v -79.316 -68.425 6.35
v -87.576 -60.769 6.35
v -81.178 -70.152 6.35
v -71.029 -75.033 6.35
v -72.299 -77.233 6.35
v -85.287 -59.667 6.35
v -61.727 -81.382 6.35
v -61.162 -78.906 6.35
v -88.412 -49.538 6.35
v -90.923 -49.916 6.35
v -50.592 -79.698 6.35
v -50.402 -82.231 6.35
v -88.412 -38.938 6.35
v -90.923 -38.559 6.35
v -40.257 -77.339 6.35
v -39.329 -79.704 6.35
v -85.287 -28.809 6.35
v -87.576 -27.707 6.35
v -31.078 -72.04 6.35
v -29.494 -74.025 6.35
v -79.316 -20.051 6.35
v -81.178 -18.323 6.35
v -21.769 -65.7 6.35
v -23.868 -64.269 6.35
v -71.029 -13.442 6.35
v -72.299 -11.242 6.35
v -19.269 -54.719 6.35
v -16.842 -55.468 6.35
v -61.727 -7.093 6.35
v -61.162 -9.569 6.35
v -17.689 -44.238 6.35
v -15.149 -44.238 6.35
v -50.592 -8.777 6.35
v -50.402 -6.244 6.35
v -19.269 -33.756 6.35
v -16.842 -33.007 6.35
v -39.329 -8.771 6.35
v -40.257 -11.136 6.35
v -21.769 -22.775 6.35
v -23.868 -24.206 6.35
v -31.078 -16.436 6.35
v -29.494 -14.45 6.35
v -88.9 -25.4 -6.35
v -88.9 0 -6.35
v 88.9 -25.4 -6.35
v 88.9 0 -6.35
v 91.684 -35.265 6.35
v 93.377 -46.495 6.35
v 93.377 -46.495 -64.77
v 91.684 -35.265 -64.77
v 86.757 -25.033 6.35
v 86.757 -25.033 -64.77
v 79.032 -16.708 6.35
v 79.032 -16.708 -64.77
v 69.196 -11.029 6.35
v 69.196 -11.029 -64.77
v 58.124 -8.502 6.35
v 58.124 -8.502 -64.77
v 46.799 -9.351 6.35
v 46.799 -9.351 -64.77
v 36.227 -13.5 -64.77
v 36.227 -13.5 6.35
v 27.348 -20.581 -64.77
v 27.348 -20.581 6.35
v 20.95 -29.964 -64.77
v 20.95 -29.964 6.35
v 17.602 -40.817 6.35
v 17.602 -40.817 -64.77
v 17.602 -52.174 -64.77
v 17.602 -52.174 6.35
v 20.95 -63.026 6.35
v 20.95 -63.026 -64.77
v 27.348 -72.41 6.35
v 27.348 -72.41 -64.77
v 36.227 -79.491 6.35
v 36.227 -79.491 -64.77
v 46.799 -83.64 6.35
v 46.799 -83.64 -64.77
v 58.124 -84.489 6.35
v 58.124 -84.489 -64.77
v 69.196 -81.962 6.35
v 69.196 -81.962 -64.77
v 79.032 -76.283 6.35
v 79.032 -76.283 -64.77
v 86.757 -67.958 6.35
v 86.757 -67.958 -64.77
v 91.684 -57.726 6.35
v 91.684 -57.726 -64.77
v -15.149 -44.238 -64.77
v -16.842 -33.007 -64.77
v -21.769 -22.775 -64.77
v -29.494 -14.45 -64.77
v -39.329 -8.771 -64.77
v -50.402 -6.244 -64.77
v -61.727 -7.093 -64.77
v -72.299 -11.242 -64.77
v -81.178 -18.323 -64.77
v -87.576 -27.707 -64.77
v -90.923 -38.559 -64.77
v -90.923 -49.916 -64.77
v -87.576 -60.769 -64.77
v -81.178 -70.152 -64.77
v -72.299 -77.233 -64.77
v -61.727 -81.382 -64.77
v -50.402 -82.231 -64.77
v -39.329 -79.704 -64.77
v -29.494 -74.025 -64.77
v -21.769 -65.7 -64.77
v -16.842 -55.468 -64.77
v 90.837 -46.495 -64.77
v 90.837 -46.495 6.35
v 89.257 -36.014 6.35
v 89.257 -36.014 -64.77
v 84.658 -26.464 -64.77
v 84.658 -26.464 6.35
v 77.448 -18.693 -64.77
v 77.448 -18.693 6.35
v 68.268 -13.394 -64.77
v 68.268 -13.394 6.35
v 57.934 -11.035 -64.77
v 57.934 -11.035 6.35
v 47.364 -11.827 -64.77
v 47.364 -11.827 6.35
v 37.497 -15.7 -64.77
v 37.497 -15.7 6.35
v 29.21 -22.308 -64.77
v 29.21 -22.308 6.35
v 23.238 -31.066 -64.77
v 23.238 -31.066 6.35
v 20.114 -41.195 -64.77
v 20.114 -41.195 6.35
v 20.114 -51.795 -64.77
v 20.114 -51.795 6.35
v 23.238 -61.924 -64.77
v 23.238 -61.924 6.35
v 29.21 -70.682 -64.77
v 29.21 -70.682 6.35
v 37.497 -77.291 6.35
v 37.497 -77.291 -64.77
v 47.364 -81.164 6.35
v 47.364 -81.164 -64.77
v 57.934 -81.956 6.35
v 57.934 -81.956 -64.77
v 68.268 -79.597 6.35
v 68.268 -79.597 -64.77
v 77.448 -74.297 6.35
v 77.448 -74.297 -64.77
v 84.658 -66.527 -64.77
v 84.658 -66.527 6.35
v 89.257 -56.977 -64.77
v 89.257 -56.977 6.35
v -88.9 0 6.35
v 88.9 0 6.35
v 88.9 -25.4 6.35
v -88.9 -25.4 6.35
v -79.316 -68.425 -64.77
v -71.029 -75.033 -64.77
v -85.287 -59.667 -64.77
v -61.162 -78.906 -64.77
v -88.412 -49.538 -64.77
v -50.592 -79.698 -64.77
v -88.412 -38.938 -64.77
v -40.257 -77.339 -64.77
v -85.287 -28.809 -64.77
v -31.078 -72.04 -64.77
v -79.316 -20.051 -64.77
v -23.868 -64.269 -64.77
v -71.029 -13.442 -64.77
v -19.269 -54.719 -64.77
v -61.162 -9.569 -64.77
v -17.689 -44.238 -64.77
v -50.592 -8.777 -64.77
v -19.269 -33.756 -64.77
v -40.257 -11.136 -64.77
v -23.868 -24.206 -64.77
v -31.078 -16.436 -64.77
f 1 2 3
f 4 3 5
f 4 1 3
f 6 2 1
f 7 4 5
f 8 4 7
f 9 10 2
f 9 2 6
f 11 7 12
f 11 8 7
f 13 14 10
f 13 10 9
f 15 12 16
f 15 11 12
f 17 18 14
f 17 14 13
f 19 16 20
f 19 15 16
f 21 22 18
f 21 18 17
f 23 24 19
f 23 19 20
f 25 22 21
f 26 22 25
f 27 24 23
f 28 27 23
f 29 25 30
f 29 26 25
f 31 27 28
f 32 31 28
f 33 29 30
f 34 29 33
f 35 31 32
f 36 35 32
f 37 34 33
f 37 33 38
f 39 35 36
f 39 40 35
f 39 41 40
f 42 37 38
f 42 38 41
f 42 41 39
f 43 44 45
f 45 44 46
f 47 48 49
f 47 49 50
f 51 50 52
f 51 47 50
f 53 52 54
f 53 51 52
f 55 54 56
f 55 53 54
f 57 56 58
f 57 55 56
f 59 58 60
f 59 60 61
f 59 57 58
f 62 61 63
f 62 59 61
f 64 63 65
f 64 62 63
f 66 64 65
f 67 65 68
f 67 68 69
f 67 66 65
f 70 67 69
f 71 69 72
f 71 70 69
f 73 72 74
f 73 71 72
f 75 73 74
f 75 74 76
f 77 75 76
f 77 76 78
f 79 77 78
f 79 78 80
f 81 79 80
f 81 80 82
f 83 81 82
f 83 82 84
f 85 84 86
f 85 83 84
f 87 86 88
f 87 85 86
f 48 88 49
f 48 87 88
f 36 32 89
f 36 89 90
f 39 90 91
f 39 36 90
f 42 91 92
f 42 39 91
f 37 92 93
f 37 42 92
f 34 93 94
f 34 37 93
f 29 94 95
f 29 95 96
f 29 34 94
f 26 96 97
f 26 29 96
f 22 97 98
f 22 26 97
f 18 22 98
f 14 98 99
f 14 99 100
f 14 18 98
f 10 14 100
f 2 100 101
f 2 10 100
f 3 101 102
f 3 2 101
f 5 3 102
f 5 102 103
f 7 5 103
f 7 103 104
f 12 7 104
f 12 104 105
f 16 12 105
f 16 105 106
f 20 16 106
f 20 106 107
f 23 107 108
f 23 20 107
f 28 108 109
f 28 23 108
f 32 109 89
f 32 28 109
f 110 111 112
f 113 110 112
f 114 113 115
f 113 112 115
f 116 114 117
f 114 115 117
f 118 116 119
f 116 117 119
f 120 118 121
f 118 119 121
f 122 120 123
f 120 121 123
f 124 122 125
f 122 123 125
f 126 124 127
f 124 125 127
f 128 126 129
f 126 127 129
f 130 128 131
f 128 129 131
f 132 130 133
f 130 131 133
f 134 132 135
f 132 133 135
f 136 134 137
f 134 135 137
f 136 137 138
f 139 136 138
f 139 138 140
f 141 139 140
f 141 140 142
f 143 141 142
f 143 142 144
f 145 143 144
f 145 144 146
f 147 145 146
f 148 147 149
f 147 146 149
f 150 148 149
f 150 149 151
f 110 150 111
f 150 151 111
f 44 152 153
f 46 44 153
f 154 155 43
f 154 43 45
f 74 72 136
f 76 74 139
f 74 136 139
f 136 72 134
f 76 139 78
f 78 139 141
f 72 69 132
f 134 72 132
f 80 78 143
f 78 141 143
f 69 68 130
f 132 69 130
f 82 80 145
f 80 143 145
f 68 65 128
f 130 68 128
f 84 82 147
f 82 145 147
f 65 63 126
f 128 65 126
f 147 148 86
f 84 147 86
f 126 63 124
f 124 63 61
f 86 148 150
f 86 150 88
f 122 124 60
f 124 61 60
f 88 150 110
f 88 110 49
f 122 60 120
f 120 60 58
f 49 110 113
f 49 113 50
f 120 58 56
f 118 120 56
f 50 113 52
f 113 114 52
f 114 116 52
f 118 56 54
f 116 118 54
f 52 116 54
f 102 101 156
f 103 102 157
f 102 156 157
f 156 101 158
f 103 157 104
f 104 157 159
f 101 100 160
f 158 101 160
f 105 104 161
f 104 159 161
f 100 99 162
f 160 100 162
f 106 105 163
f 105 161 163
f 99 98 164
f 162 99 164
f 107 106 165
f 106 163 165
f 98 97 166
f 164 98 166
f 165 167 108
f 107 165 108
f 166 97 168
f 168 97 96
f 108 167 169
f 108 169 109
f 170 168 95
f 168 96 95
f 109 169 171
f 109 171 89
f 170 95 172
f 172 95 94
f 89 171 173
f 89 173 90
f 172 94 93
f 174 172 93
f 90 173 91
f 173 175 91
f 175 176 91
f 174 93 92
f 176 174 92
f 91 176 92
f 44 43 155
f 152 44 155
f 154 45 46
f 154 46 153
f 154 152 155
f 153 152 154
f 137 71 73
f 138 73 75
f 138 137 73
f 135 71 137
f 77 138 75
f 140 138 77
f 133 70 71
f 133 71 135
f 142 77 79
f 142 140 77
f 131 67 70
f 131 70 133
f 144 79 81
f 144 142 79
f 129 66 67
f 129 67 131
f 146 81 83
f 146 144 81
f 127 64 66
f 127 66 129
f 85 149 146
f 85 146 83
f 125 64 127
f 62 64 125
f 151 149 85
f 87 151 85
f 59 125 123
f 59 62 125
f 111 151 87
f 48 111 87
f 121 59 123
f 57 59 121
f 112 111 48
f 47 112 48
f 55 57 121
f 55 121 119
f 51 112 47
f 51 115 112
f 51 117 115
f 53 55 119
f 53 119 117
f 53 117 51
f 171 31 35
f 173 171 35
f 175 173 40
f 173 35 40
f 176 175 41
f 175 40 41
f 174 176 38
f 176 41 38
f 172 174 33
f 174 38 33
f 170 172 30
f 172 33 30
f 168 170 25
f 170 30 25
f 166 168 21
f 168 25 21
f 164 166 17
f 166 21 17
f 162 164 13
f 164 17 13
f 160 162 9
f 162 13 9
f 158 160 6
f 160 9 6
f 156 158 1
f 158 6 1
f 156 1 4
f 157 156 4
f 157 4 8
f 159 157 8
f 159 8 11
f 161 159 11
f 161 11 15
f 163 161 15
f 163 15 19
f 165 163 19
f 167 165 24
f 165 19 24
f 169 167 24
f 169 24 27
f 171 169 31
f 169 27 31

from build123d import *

# Parameters (mm, degrees)
F0_W     = 177.8
F0_H     = 12.7
F1_DEPTH = 25.4
F2_R     = 38.1
F2_R_2   = 35.56
F3_DEPTH = 71.12


with BuildPart() as f1:
    # F0 (on Front) → F1 (new body)
    with BuildSketch(Plane.XZ):
        Rectangle(F0_W, F0_H)
    extrude(amount=F1_DEPTH)


with BuildPart() as f3:
    # F2 (on face) → F3 (new body)
    with BuildSketch(Plane.XY.offset(6.35)):
        with Locations((-53.248975, -44.237614)):
            Circle(F2_R)
        with Locations((-53.248975, -44.237614)):
            Circle(F2_R_2, mode=Mode.SUBTRACT)
        with Locations((55.276845, -46.4954)):
            Circle(F2_R)
        with Locations((55.276845, -46.4954)):
            Circle(F2_R_2, mode=Mode.SUBTRACT)
    extrude(amount=-F3_DEPTH)


solid = Compound([f1.part, f3.part])
